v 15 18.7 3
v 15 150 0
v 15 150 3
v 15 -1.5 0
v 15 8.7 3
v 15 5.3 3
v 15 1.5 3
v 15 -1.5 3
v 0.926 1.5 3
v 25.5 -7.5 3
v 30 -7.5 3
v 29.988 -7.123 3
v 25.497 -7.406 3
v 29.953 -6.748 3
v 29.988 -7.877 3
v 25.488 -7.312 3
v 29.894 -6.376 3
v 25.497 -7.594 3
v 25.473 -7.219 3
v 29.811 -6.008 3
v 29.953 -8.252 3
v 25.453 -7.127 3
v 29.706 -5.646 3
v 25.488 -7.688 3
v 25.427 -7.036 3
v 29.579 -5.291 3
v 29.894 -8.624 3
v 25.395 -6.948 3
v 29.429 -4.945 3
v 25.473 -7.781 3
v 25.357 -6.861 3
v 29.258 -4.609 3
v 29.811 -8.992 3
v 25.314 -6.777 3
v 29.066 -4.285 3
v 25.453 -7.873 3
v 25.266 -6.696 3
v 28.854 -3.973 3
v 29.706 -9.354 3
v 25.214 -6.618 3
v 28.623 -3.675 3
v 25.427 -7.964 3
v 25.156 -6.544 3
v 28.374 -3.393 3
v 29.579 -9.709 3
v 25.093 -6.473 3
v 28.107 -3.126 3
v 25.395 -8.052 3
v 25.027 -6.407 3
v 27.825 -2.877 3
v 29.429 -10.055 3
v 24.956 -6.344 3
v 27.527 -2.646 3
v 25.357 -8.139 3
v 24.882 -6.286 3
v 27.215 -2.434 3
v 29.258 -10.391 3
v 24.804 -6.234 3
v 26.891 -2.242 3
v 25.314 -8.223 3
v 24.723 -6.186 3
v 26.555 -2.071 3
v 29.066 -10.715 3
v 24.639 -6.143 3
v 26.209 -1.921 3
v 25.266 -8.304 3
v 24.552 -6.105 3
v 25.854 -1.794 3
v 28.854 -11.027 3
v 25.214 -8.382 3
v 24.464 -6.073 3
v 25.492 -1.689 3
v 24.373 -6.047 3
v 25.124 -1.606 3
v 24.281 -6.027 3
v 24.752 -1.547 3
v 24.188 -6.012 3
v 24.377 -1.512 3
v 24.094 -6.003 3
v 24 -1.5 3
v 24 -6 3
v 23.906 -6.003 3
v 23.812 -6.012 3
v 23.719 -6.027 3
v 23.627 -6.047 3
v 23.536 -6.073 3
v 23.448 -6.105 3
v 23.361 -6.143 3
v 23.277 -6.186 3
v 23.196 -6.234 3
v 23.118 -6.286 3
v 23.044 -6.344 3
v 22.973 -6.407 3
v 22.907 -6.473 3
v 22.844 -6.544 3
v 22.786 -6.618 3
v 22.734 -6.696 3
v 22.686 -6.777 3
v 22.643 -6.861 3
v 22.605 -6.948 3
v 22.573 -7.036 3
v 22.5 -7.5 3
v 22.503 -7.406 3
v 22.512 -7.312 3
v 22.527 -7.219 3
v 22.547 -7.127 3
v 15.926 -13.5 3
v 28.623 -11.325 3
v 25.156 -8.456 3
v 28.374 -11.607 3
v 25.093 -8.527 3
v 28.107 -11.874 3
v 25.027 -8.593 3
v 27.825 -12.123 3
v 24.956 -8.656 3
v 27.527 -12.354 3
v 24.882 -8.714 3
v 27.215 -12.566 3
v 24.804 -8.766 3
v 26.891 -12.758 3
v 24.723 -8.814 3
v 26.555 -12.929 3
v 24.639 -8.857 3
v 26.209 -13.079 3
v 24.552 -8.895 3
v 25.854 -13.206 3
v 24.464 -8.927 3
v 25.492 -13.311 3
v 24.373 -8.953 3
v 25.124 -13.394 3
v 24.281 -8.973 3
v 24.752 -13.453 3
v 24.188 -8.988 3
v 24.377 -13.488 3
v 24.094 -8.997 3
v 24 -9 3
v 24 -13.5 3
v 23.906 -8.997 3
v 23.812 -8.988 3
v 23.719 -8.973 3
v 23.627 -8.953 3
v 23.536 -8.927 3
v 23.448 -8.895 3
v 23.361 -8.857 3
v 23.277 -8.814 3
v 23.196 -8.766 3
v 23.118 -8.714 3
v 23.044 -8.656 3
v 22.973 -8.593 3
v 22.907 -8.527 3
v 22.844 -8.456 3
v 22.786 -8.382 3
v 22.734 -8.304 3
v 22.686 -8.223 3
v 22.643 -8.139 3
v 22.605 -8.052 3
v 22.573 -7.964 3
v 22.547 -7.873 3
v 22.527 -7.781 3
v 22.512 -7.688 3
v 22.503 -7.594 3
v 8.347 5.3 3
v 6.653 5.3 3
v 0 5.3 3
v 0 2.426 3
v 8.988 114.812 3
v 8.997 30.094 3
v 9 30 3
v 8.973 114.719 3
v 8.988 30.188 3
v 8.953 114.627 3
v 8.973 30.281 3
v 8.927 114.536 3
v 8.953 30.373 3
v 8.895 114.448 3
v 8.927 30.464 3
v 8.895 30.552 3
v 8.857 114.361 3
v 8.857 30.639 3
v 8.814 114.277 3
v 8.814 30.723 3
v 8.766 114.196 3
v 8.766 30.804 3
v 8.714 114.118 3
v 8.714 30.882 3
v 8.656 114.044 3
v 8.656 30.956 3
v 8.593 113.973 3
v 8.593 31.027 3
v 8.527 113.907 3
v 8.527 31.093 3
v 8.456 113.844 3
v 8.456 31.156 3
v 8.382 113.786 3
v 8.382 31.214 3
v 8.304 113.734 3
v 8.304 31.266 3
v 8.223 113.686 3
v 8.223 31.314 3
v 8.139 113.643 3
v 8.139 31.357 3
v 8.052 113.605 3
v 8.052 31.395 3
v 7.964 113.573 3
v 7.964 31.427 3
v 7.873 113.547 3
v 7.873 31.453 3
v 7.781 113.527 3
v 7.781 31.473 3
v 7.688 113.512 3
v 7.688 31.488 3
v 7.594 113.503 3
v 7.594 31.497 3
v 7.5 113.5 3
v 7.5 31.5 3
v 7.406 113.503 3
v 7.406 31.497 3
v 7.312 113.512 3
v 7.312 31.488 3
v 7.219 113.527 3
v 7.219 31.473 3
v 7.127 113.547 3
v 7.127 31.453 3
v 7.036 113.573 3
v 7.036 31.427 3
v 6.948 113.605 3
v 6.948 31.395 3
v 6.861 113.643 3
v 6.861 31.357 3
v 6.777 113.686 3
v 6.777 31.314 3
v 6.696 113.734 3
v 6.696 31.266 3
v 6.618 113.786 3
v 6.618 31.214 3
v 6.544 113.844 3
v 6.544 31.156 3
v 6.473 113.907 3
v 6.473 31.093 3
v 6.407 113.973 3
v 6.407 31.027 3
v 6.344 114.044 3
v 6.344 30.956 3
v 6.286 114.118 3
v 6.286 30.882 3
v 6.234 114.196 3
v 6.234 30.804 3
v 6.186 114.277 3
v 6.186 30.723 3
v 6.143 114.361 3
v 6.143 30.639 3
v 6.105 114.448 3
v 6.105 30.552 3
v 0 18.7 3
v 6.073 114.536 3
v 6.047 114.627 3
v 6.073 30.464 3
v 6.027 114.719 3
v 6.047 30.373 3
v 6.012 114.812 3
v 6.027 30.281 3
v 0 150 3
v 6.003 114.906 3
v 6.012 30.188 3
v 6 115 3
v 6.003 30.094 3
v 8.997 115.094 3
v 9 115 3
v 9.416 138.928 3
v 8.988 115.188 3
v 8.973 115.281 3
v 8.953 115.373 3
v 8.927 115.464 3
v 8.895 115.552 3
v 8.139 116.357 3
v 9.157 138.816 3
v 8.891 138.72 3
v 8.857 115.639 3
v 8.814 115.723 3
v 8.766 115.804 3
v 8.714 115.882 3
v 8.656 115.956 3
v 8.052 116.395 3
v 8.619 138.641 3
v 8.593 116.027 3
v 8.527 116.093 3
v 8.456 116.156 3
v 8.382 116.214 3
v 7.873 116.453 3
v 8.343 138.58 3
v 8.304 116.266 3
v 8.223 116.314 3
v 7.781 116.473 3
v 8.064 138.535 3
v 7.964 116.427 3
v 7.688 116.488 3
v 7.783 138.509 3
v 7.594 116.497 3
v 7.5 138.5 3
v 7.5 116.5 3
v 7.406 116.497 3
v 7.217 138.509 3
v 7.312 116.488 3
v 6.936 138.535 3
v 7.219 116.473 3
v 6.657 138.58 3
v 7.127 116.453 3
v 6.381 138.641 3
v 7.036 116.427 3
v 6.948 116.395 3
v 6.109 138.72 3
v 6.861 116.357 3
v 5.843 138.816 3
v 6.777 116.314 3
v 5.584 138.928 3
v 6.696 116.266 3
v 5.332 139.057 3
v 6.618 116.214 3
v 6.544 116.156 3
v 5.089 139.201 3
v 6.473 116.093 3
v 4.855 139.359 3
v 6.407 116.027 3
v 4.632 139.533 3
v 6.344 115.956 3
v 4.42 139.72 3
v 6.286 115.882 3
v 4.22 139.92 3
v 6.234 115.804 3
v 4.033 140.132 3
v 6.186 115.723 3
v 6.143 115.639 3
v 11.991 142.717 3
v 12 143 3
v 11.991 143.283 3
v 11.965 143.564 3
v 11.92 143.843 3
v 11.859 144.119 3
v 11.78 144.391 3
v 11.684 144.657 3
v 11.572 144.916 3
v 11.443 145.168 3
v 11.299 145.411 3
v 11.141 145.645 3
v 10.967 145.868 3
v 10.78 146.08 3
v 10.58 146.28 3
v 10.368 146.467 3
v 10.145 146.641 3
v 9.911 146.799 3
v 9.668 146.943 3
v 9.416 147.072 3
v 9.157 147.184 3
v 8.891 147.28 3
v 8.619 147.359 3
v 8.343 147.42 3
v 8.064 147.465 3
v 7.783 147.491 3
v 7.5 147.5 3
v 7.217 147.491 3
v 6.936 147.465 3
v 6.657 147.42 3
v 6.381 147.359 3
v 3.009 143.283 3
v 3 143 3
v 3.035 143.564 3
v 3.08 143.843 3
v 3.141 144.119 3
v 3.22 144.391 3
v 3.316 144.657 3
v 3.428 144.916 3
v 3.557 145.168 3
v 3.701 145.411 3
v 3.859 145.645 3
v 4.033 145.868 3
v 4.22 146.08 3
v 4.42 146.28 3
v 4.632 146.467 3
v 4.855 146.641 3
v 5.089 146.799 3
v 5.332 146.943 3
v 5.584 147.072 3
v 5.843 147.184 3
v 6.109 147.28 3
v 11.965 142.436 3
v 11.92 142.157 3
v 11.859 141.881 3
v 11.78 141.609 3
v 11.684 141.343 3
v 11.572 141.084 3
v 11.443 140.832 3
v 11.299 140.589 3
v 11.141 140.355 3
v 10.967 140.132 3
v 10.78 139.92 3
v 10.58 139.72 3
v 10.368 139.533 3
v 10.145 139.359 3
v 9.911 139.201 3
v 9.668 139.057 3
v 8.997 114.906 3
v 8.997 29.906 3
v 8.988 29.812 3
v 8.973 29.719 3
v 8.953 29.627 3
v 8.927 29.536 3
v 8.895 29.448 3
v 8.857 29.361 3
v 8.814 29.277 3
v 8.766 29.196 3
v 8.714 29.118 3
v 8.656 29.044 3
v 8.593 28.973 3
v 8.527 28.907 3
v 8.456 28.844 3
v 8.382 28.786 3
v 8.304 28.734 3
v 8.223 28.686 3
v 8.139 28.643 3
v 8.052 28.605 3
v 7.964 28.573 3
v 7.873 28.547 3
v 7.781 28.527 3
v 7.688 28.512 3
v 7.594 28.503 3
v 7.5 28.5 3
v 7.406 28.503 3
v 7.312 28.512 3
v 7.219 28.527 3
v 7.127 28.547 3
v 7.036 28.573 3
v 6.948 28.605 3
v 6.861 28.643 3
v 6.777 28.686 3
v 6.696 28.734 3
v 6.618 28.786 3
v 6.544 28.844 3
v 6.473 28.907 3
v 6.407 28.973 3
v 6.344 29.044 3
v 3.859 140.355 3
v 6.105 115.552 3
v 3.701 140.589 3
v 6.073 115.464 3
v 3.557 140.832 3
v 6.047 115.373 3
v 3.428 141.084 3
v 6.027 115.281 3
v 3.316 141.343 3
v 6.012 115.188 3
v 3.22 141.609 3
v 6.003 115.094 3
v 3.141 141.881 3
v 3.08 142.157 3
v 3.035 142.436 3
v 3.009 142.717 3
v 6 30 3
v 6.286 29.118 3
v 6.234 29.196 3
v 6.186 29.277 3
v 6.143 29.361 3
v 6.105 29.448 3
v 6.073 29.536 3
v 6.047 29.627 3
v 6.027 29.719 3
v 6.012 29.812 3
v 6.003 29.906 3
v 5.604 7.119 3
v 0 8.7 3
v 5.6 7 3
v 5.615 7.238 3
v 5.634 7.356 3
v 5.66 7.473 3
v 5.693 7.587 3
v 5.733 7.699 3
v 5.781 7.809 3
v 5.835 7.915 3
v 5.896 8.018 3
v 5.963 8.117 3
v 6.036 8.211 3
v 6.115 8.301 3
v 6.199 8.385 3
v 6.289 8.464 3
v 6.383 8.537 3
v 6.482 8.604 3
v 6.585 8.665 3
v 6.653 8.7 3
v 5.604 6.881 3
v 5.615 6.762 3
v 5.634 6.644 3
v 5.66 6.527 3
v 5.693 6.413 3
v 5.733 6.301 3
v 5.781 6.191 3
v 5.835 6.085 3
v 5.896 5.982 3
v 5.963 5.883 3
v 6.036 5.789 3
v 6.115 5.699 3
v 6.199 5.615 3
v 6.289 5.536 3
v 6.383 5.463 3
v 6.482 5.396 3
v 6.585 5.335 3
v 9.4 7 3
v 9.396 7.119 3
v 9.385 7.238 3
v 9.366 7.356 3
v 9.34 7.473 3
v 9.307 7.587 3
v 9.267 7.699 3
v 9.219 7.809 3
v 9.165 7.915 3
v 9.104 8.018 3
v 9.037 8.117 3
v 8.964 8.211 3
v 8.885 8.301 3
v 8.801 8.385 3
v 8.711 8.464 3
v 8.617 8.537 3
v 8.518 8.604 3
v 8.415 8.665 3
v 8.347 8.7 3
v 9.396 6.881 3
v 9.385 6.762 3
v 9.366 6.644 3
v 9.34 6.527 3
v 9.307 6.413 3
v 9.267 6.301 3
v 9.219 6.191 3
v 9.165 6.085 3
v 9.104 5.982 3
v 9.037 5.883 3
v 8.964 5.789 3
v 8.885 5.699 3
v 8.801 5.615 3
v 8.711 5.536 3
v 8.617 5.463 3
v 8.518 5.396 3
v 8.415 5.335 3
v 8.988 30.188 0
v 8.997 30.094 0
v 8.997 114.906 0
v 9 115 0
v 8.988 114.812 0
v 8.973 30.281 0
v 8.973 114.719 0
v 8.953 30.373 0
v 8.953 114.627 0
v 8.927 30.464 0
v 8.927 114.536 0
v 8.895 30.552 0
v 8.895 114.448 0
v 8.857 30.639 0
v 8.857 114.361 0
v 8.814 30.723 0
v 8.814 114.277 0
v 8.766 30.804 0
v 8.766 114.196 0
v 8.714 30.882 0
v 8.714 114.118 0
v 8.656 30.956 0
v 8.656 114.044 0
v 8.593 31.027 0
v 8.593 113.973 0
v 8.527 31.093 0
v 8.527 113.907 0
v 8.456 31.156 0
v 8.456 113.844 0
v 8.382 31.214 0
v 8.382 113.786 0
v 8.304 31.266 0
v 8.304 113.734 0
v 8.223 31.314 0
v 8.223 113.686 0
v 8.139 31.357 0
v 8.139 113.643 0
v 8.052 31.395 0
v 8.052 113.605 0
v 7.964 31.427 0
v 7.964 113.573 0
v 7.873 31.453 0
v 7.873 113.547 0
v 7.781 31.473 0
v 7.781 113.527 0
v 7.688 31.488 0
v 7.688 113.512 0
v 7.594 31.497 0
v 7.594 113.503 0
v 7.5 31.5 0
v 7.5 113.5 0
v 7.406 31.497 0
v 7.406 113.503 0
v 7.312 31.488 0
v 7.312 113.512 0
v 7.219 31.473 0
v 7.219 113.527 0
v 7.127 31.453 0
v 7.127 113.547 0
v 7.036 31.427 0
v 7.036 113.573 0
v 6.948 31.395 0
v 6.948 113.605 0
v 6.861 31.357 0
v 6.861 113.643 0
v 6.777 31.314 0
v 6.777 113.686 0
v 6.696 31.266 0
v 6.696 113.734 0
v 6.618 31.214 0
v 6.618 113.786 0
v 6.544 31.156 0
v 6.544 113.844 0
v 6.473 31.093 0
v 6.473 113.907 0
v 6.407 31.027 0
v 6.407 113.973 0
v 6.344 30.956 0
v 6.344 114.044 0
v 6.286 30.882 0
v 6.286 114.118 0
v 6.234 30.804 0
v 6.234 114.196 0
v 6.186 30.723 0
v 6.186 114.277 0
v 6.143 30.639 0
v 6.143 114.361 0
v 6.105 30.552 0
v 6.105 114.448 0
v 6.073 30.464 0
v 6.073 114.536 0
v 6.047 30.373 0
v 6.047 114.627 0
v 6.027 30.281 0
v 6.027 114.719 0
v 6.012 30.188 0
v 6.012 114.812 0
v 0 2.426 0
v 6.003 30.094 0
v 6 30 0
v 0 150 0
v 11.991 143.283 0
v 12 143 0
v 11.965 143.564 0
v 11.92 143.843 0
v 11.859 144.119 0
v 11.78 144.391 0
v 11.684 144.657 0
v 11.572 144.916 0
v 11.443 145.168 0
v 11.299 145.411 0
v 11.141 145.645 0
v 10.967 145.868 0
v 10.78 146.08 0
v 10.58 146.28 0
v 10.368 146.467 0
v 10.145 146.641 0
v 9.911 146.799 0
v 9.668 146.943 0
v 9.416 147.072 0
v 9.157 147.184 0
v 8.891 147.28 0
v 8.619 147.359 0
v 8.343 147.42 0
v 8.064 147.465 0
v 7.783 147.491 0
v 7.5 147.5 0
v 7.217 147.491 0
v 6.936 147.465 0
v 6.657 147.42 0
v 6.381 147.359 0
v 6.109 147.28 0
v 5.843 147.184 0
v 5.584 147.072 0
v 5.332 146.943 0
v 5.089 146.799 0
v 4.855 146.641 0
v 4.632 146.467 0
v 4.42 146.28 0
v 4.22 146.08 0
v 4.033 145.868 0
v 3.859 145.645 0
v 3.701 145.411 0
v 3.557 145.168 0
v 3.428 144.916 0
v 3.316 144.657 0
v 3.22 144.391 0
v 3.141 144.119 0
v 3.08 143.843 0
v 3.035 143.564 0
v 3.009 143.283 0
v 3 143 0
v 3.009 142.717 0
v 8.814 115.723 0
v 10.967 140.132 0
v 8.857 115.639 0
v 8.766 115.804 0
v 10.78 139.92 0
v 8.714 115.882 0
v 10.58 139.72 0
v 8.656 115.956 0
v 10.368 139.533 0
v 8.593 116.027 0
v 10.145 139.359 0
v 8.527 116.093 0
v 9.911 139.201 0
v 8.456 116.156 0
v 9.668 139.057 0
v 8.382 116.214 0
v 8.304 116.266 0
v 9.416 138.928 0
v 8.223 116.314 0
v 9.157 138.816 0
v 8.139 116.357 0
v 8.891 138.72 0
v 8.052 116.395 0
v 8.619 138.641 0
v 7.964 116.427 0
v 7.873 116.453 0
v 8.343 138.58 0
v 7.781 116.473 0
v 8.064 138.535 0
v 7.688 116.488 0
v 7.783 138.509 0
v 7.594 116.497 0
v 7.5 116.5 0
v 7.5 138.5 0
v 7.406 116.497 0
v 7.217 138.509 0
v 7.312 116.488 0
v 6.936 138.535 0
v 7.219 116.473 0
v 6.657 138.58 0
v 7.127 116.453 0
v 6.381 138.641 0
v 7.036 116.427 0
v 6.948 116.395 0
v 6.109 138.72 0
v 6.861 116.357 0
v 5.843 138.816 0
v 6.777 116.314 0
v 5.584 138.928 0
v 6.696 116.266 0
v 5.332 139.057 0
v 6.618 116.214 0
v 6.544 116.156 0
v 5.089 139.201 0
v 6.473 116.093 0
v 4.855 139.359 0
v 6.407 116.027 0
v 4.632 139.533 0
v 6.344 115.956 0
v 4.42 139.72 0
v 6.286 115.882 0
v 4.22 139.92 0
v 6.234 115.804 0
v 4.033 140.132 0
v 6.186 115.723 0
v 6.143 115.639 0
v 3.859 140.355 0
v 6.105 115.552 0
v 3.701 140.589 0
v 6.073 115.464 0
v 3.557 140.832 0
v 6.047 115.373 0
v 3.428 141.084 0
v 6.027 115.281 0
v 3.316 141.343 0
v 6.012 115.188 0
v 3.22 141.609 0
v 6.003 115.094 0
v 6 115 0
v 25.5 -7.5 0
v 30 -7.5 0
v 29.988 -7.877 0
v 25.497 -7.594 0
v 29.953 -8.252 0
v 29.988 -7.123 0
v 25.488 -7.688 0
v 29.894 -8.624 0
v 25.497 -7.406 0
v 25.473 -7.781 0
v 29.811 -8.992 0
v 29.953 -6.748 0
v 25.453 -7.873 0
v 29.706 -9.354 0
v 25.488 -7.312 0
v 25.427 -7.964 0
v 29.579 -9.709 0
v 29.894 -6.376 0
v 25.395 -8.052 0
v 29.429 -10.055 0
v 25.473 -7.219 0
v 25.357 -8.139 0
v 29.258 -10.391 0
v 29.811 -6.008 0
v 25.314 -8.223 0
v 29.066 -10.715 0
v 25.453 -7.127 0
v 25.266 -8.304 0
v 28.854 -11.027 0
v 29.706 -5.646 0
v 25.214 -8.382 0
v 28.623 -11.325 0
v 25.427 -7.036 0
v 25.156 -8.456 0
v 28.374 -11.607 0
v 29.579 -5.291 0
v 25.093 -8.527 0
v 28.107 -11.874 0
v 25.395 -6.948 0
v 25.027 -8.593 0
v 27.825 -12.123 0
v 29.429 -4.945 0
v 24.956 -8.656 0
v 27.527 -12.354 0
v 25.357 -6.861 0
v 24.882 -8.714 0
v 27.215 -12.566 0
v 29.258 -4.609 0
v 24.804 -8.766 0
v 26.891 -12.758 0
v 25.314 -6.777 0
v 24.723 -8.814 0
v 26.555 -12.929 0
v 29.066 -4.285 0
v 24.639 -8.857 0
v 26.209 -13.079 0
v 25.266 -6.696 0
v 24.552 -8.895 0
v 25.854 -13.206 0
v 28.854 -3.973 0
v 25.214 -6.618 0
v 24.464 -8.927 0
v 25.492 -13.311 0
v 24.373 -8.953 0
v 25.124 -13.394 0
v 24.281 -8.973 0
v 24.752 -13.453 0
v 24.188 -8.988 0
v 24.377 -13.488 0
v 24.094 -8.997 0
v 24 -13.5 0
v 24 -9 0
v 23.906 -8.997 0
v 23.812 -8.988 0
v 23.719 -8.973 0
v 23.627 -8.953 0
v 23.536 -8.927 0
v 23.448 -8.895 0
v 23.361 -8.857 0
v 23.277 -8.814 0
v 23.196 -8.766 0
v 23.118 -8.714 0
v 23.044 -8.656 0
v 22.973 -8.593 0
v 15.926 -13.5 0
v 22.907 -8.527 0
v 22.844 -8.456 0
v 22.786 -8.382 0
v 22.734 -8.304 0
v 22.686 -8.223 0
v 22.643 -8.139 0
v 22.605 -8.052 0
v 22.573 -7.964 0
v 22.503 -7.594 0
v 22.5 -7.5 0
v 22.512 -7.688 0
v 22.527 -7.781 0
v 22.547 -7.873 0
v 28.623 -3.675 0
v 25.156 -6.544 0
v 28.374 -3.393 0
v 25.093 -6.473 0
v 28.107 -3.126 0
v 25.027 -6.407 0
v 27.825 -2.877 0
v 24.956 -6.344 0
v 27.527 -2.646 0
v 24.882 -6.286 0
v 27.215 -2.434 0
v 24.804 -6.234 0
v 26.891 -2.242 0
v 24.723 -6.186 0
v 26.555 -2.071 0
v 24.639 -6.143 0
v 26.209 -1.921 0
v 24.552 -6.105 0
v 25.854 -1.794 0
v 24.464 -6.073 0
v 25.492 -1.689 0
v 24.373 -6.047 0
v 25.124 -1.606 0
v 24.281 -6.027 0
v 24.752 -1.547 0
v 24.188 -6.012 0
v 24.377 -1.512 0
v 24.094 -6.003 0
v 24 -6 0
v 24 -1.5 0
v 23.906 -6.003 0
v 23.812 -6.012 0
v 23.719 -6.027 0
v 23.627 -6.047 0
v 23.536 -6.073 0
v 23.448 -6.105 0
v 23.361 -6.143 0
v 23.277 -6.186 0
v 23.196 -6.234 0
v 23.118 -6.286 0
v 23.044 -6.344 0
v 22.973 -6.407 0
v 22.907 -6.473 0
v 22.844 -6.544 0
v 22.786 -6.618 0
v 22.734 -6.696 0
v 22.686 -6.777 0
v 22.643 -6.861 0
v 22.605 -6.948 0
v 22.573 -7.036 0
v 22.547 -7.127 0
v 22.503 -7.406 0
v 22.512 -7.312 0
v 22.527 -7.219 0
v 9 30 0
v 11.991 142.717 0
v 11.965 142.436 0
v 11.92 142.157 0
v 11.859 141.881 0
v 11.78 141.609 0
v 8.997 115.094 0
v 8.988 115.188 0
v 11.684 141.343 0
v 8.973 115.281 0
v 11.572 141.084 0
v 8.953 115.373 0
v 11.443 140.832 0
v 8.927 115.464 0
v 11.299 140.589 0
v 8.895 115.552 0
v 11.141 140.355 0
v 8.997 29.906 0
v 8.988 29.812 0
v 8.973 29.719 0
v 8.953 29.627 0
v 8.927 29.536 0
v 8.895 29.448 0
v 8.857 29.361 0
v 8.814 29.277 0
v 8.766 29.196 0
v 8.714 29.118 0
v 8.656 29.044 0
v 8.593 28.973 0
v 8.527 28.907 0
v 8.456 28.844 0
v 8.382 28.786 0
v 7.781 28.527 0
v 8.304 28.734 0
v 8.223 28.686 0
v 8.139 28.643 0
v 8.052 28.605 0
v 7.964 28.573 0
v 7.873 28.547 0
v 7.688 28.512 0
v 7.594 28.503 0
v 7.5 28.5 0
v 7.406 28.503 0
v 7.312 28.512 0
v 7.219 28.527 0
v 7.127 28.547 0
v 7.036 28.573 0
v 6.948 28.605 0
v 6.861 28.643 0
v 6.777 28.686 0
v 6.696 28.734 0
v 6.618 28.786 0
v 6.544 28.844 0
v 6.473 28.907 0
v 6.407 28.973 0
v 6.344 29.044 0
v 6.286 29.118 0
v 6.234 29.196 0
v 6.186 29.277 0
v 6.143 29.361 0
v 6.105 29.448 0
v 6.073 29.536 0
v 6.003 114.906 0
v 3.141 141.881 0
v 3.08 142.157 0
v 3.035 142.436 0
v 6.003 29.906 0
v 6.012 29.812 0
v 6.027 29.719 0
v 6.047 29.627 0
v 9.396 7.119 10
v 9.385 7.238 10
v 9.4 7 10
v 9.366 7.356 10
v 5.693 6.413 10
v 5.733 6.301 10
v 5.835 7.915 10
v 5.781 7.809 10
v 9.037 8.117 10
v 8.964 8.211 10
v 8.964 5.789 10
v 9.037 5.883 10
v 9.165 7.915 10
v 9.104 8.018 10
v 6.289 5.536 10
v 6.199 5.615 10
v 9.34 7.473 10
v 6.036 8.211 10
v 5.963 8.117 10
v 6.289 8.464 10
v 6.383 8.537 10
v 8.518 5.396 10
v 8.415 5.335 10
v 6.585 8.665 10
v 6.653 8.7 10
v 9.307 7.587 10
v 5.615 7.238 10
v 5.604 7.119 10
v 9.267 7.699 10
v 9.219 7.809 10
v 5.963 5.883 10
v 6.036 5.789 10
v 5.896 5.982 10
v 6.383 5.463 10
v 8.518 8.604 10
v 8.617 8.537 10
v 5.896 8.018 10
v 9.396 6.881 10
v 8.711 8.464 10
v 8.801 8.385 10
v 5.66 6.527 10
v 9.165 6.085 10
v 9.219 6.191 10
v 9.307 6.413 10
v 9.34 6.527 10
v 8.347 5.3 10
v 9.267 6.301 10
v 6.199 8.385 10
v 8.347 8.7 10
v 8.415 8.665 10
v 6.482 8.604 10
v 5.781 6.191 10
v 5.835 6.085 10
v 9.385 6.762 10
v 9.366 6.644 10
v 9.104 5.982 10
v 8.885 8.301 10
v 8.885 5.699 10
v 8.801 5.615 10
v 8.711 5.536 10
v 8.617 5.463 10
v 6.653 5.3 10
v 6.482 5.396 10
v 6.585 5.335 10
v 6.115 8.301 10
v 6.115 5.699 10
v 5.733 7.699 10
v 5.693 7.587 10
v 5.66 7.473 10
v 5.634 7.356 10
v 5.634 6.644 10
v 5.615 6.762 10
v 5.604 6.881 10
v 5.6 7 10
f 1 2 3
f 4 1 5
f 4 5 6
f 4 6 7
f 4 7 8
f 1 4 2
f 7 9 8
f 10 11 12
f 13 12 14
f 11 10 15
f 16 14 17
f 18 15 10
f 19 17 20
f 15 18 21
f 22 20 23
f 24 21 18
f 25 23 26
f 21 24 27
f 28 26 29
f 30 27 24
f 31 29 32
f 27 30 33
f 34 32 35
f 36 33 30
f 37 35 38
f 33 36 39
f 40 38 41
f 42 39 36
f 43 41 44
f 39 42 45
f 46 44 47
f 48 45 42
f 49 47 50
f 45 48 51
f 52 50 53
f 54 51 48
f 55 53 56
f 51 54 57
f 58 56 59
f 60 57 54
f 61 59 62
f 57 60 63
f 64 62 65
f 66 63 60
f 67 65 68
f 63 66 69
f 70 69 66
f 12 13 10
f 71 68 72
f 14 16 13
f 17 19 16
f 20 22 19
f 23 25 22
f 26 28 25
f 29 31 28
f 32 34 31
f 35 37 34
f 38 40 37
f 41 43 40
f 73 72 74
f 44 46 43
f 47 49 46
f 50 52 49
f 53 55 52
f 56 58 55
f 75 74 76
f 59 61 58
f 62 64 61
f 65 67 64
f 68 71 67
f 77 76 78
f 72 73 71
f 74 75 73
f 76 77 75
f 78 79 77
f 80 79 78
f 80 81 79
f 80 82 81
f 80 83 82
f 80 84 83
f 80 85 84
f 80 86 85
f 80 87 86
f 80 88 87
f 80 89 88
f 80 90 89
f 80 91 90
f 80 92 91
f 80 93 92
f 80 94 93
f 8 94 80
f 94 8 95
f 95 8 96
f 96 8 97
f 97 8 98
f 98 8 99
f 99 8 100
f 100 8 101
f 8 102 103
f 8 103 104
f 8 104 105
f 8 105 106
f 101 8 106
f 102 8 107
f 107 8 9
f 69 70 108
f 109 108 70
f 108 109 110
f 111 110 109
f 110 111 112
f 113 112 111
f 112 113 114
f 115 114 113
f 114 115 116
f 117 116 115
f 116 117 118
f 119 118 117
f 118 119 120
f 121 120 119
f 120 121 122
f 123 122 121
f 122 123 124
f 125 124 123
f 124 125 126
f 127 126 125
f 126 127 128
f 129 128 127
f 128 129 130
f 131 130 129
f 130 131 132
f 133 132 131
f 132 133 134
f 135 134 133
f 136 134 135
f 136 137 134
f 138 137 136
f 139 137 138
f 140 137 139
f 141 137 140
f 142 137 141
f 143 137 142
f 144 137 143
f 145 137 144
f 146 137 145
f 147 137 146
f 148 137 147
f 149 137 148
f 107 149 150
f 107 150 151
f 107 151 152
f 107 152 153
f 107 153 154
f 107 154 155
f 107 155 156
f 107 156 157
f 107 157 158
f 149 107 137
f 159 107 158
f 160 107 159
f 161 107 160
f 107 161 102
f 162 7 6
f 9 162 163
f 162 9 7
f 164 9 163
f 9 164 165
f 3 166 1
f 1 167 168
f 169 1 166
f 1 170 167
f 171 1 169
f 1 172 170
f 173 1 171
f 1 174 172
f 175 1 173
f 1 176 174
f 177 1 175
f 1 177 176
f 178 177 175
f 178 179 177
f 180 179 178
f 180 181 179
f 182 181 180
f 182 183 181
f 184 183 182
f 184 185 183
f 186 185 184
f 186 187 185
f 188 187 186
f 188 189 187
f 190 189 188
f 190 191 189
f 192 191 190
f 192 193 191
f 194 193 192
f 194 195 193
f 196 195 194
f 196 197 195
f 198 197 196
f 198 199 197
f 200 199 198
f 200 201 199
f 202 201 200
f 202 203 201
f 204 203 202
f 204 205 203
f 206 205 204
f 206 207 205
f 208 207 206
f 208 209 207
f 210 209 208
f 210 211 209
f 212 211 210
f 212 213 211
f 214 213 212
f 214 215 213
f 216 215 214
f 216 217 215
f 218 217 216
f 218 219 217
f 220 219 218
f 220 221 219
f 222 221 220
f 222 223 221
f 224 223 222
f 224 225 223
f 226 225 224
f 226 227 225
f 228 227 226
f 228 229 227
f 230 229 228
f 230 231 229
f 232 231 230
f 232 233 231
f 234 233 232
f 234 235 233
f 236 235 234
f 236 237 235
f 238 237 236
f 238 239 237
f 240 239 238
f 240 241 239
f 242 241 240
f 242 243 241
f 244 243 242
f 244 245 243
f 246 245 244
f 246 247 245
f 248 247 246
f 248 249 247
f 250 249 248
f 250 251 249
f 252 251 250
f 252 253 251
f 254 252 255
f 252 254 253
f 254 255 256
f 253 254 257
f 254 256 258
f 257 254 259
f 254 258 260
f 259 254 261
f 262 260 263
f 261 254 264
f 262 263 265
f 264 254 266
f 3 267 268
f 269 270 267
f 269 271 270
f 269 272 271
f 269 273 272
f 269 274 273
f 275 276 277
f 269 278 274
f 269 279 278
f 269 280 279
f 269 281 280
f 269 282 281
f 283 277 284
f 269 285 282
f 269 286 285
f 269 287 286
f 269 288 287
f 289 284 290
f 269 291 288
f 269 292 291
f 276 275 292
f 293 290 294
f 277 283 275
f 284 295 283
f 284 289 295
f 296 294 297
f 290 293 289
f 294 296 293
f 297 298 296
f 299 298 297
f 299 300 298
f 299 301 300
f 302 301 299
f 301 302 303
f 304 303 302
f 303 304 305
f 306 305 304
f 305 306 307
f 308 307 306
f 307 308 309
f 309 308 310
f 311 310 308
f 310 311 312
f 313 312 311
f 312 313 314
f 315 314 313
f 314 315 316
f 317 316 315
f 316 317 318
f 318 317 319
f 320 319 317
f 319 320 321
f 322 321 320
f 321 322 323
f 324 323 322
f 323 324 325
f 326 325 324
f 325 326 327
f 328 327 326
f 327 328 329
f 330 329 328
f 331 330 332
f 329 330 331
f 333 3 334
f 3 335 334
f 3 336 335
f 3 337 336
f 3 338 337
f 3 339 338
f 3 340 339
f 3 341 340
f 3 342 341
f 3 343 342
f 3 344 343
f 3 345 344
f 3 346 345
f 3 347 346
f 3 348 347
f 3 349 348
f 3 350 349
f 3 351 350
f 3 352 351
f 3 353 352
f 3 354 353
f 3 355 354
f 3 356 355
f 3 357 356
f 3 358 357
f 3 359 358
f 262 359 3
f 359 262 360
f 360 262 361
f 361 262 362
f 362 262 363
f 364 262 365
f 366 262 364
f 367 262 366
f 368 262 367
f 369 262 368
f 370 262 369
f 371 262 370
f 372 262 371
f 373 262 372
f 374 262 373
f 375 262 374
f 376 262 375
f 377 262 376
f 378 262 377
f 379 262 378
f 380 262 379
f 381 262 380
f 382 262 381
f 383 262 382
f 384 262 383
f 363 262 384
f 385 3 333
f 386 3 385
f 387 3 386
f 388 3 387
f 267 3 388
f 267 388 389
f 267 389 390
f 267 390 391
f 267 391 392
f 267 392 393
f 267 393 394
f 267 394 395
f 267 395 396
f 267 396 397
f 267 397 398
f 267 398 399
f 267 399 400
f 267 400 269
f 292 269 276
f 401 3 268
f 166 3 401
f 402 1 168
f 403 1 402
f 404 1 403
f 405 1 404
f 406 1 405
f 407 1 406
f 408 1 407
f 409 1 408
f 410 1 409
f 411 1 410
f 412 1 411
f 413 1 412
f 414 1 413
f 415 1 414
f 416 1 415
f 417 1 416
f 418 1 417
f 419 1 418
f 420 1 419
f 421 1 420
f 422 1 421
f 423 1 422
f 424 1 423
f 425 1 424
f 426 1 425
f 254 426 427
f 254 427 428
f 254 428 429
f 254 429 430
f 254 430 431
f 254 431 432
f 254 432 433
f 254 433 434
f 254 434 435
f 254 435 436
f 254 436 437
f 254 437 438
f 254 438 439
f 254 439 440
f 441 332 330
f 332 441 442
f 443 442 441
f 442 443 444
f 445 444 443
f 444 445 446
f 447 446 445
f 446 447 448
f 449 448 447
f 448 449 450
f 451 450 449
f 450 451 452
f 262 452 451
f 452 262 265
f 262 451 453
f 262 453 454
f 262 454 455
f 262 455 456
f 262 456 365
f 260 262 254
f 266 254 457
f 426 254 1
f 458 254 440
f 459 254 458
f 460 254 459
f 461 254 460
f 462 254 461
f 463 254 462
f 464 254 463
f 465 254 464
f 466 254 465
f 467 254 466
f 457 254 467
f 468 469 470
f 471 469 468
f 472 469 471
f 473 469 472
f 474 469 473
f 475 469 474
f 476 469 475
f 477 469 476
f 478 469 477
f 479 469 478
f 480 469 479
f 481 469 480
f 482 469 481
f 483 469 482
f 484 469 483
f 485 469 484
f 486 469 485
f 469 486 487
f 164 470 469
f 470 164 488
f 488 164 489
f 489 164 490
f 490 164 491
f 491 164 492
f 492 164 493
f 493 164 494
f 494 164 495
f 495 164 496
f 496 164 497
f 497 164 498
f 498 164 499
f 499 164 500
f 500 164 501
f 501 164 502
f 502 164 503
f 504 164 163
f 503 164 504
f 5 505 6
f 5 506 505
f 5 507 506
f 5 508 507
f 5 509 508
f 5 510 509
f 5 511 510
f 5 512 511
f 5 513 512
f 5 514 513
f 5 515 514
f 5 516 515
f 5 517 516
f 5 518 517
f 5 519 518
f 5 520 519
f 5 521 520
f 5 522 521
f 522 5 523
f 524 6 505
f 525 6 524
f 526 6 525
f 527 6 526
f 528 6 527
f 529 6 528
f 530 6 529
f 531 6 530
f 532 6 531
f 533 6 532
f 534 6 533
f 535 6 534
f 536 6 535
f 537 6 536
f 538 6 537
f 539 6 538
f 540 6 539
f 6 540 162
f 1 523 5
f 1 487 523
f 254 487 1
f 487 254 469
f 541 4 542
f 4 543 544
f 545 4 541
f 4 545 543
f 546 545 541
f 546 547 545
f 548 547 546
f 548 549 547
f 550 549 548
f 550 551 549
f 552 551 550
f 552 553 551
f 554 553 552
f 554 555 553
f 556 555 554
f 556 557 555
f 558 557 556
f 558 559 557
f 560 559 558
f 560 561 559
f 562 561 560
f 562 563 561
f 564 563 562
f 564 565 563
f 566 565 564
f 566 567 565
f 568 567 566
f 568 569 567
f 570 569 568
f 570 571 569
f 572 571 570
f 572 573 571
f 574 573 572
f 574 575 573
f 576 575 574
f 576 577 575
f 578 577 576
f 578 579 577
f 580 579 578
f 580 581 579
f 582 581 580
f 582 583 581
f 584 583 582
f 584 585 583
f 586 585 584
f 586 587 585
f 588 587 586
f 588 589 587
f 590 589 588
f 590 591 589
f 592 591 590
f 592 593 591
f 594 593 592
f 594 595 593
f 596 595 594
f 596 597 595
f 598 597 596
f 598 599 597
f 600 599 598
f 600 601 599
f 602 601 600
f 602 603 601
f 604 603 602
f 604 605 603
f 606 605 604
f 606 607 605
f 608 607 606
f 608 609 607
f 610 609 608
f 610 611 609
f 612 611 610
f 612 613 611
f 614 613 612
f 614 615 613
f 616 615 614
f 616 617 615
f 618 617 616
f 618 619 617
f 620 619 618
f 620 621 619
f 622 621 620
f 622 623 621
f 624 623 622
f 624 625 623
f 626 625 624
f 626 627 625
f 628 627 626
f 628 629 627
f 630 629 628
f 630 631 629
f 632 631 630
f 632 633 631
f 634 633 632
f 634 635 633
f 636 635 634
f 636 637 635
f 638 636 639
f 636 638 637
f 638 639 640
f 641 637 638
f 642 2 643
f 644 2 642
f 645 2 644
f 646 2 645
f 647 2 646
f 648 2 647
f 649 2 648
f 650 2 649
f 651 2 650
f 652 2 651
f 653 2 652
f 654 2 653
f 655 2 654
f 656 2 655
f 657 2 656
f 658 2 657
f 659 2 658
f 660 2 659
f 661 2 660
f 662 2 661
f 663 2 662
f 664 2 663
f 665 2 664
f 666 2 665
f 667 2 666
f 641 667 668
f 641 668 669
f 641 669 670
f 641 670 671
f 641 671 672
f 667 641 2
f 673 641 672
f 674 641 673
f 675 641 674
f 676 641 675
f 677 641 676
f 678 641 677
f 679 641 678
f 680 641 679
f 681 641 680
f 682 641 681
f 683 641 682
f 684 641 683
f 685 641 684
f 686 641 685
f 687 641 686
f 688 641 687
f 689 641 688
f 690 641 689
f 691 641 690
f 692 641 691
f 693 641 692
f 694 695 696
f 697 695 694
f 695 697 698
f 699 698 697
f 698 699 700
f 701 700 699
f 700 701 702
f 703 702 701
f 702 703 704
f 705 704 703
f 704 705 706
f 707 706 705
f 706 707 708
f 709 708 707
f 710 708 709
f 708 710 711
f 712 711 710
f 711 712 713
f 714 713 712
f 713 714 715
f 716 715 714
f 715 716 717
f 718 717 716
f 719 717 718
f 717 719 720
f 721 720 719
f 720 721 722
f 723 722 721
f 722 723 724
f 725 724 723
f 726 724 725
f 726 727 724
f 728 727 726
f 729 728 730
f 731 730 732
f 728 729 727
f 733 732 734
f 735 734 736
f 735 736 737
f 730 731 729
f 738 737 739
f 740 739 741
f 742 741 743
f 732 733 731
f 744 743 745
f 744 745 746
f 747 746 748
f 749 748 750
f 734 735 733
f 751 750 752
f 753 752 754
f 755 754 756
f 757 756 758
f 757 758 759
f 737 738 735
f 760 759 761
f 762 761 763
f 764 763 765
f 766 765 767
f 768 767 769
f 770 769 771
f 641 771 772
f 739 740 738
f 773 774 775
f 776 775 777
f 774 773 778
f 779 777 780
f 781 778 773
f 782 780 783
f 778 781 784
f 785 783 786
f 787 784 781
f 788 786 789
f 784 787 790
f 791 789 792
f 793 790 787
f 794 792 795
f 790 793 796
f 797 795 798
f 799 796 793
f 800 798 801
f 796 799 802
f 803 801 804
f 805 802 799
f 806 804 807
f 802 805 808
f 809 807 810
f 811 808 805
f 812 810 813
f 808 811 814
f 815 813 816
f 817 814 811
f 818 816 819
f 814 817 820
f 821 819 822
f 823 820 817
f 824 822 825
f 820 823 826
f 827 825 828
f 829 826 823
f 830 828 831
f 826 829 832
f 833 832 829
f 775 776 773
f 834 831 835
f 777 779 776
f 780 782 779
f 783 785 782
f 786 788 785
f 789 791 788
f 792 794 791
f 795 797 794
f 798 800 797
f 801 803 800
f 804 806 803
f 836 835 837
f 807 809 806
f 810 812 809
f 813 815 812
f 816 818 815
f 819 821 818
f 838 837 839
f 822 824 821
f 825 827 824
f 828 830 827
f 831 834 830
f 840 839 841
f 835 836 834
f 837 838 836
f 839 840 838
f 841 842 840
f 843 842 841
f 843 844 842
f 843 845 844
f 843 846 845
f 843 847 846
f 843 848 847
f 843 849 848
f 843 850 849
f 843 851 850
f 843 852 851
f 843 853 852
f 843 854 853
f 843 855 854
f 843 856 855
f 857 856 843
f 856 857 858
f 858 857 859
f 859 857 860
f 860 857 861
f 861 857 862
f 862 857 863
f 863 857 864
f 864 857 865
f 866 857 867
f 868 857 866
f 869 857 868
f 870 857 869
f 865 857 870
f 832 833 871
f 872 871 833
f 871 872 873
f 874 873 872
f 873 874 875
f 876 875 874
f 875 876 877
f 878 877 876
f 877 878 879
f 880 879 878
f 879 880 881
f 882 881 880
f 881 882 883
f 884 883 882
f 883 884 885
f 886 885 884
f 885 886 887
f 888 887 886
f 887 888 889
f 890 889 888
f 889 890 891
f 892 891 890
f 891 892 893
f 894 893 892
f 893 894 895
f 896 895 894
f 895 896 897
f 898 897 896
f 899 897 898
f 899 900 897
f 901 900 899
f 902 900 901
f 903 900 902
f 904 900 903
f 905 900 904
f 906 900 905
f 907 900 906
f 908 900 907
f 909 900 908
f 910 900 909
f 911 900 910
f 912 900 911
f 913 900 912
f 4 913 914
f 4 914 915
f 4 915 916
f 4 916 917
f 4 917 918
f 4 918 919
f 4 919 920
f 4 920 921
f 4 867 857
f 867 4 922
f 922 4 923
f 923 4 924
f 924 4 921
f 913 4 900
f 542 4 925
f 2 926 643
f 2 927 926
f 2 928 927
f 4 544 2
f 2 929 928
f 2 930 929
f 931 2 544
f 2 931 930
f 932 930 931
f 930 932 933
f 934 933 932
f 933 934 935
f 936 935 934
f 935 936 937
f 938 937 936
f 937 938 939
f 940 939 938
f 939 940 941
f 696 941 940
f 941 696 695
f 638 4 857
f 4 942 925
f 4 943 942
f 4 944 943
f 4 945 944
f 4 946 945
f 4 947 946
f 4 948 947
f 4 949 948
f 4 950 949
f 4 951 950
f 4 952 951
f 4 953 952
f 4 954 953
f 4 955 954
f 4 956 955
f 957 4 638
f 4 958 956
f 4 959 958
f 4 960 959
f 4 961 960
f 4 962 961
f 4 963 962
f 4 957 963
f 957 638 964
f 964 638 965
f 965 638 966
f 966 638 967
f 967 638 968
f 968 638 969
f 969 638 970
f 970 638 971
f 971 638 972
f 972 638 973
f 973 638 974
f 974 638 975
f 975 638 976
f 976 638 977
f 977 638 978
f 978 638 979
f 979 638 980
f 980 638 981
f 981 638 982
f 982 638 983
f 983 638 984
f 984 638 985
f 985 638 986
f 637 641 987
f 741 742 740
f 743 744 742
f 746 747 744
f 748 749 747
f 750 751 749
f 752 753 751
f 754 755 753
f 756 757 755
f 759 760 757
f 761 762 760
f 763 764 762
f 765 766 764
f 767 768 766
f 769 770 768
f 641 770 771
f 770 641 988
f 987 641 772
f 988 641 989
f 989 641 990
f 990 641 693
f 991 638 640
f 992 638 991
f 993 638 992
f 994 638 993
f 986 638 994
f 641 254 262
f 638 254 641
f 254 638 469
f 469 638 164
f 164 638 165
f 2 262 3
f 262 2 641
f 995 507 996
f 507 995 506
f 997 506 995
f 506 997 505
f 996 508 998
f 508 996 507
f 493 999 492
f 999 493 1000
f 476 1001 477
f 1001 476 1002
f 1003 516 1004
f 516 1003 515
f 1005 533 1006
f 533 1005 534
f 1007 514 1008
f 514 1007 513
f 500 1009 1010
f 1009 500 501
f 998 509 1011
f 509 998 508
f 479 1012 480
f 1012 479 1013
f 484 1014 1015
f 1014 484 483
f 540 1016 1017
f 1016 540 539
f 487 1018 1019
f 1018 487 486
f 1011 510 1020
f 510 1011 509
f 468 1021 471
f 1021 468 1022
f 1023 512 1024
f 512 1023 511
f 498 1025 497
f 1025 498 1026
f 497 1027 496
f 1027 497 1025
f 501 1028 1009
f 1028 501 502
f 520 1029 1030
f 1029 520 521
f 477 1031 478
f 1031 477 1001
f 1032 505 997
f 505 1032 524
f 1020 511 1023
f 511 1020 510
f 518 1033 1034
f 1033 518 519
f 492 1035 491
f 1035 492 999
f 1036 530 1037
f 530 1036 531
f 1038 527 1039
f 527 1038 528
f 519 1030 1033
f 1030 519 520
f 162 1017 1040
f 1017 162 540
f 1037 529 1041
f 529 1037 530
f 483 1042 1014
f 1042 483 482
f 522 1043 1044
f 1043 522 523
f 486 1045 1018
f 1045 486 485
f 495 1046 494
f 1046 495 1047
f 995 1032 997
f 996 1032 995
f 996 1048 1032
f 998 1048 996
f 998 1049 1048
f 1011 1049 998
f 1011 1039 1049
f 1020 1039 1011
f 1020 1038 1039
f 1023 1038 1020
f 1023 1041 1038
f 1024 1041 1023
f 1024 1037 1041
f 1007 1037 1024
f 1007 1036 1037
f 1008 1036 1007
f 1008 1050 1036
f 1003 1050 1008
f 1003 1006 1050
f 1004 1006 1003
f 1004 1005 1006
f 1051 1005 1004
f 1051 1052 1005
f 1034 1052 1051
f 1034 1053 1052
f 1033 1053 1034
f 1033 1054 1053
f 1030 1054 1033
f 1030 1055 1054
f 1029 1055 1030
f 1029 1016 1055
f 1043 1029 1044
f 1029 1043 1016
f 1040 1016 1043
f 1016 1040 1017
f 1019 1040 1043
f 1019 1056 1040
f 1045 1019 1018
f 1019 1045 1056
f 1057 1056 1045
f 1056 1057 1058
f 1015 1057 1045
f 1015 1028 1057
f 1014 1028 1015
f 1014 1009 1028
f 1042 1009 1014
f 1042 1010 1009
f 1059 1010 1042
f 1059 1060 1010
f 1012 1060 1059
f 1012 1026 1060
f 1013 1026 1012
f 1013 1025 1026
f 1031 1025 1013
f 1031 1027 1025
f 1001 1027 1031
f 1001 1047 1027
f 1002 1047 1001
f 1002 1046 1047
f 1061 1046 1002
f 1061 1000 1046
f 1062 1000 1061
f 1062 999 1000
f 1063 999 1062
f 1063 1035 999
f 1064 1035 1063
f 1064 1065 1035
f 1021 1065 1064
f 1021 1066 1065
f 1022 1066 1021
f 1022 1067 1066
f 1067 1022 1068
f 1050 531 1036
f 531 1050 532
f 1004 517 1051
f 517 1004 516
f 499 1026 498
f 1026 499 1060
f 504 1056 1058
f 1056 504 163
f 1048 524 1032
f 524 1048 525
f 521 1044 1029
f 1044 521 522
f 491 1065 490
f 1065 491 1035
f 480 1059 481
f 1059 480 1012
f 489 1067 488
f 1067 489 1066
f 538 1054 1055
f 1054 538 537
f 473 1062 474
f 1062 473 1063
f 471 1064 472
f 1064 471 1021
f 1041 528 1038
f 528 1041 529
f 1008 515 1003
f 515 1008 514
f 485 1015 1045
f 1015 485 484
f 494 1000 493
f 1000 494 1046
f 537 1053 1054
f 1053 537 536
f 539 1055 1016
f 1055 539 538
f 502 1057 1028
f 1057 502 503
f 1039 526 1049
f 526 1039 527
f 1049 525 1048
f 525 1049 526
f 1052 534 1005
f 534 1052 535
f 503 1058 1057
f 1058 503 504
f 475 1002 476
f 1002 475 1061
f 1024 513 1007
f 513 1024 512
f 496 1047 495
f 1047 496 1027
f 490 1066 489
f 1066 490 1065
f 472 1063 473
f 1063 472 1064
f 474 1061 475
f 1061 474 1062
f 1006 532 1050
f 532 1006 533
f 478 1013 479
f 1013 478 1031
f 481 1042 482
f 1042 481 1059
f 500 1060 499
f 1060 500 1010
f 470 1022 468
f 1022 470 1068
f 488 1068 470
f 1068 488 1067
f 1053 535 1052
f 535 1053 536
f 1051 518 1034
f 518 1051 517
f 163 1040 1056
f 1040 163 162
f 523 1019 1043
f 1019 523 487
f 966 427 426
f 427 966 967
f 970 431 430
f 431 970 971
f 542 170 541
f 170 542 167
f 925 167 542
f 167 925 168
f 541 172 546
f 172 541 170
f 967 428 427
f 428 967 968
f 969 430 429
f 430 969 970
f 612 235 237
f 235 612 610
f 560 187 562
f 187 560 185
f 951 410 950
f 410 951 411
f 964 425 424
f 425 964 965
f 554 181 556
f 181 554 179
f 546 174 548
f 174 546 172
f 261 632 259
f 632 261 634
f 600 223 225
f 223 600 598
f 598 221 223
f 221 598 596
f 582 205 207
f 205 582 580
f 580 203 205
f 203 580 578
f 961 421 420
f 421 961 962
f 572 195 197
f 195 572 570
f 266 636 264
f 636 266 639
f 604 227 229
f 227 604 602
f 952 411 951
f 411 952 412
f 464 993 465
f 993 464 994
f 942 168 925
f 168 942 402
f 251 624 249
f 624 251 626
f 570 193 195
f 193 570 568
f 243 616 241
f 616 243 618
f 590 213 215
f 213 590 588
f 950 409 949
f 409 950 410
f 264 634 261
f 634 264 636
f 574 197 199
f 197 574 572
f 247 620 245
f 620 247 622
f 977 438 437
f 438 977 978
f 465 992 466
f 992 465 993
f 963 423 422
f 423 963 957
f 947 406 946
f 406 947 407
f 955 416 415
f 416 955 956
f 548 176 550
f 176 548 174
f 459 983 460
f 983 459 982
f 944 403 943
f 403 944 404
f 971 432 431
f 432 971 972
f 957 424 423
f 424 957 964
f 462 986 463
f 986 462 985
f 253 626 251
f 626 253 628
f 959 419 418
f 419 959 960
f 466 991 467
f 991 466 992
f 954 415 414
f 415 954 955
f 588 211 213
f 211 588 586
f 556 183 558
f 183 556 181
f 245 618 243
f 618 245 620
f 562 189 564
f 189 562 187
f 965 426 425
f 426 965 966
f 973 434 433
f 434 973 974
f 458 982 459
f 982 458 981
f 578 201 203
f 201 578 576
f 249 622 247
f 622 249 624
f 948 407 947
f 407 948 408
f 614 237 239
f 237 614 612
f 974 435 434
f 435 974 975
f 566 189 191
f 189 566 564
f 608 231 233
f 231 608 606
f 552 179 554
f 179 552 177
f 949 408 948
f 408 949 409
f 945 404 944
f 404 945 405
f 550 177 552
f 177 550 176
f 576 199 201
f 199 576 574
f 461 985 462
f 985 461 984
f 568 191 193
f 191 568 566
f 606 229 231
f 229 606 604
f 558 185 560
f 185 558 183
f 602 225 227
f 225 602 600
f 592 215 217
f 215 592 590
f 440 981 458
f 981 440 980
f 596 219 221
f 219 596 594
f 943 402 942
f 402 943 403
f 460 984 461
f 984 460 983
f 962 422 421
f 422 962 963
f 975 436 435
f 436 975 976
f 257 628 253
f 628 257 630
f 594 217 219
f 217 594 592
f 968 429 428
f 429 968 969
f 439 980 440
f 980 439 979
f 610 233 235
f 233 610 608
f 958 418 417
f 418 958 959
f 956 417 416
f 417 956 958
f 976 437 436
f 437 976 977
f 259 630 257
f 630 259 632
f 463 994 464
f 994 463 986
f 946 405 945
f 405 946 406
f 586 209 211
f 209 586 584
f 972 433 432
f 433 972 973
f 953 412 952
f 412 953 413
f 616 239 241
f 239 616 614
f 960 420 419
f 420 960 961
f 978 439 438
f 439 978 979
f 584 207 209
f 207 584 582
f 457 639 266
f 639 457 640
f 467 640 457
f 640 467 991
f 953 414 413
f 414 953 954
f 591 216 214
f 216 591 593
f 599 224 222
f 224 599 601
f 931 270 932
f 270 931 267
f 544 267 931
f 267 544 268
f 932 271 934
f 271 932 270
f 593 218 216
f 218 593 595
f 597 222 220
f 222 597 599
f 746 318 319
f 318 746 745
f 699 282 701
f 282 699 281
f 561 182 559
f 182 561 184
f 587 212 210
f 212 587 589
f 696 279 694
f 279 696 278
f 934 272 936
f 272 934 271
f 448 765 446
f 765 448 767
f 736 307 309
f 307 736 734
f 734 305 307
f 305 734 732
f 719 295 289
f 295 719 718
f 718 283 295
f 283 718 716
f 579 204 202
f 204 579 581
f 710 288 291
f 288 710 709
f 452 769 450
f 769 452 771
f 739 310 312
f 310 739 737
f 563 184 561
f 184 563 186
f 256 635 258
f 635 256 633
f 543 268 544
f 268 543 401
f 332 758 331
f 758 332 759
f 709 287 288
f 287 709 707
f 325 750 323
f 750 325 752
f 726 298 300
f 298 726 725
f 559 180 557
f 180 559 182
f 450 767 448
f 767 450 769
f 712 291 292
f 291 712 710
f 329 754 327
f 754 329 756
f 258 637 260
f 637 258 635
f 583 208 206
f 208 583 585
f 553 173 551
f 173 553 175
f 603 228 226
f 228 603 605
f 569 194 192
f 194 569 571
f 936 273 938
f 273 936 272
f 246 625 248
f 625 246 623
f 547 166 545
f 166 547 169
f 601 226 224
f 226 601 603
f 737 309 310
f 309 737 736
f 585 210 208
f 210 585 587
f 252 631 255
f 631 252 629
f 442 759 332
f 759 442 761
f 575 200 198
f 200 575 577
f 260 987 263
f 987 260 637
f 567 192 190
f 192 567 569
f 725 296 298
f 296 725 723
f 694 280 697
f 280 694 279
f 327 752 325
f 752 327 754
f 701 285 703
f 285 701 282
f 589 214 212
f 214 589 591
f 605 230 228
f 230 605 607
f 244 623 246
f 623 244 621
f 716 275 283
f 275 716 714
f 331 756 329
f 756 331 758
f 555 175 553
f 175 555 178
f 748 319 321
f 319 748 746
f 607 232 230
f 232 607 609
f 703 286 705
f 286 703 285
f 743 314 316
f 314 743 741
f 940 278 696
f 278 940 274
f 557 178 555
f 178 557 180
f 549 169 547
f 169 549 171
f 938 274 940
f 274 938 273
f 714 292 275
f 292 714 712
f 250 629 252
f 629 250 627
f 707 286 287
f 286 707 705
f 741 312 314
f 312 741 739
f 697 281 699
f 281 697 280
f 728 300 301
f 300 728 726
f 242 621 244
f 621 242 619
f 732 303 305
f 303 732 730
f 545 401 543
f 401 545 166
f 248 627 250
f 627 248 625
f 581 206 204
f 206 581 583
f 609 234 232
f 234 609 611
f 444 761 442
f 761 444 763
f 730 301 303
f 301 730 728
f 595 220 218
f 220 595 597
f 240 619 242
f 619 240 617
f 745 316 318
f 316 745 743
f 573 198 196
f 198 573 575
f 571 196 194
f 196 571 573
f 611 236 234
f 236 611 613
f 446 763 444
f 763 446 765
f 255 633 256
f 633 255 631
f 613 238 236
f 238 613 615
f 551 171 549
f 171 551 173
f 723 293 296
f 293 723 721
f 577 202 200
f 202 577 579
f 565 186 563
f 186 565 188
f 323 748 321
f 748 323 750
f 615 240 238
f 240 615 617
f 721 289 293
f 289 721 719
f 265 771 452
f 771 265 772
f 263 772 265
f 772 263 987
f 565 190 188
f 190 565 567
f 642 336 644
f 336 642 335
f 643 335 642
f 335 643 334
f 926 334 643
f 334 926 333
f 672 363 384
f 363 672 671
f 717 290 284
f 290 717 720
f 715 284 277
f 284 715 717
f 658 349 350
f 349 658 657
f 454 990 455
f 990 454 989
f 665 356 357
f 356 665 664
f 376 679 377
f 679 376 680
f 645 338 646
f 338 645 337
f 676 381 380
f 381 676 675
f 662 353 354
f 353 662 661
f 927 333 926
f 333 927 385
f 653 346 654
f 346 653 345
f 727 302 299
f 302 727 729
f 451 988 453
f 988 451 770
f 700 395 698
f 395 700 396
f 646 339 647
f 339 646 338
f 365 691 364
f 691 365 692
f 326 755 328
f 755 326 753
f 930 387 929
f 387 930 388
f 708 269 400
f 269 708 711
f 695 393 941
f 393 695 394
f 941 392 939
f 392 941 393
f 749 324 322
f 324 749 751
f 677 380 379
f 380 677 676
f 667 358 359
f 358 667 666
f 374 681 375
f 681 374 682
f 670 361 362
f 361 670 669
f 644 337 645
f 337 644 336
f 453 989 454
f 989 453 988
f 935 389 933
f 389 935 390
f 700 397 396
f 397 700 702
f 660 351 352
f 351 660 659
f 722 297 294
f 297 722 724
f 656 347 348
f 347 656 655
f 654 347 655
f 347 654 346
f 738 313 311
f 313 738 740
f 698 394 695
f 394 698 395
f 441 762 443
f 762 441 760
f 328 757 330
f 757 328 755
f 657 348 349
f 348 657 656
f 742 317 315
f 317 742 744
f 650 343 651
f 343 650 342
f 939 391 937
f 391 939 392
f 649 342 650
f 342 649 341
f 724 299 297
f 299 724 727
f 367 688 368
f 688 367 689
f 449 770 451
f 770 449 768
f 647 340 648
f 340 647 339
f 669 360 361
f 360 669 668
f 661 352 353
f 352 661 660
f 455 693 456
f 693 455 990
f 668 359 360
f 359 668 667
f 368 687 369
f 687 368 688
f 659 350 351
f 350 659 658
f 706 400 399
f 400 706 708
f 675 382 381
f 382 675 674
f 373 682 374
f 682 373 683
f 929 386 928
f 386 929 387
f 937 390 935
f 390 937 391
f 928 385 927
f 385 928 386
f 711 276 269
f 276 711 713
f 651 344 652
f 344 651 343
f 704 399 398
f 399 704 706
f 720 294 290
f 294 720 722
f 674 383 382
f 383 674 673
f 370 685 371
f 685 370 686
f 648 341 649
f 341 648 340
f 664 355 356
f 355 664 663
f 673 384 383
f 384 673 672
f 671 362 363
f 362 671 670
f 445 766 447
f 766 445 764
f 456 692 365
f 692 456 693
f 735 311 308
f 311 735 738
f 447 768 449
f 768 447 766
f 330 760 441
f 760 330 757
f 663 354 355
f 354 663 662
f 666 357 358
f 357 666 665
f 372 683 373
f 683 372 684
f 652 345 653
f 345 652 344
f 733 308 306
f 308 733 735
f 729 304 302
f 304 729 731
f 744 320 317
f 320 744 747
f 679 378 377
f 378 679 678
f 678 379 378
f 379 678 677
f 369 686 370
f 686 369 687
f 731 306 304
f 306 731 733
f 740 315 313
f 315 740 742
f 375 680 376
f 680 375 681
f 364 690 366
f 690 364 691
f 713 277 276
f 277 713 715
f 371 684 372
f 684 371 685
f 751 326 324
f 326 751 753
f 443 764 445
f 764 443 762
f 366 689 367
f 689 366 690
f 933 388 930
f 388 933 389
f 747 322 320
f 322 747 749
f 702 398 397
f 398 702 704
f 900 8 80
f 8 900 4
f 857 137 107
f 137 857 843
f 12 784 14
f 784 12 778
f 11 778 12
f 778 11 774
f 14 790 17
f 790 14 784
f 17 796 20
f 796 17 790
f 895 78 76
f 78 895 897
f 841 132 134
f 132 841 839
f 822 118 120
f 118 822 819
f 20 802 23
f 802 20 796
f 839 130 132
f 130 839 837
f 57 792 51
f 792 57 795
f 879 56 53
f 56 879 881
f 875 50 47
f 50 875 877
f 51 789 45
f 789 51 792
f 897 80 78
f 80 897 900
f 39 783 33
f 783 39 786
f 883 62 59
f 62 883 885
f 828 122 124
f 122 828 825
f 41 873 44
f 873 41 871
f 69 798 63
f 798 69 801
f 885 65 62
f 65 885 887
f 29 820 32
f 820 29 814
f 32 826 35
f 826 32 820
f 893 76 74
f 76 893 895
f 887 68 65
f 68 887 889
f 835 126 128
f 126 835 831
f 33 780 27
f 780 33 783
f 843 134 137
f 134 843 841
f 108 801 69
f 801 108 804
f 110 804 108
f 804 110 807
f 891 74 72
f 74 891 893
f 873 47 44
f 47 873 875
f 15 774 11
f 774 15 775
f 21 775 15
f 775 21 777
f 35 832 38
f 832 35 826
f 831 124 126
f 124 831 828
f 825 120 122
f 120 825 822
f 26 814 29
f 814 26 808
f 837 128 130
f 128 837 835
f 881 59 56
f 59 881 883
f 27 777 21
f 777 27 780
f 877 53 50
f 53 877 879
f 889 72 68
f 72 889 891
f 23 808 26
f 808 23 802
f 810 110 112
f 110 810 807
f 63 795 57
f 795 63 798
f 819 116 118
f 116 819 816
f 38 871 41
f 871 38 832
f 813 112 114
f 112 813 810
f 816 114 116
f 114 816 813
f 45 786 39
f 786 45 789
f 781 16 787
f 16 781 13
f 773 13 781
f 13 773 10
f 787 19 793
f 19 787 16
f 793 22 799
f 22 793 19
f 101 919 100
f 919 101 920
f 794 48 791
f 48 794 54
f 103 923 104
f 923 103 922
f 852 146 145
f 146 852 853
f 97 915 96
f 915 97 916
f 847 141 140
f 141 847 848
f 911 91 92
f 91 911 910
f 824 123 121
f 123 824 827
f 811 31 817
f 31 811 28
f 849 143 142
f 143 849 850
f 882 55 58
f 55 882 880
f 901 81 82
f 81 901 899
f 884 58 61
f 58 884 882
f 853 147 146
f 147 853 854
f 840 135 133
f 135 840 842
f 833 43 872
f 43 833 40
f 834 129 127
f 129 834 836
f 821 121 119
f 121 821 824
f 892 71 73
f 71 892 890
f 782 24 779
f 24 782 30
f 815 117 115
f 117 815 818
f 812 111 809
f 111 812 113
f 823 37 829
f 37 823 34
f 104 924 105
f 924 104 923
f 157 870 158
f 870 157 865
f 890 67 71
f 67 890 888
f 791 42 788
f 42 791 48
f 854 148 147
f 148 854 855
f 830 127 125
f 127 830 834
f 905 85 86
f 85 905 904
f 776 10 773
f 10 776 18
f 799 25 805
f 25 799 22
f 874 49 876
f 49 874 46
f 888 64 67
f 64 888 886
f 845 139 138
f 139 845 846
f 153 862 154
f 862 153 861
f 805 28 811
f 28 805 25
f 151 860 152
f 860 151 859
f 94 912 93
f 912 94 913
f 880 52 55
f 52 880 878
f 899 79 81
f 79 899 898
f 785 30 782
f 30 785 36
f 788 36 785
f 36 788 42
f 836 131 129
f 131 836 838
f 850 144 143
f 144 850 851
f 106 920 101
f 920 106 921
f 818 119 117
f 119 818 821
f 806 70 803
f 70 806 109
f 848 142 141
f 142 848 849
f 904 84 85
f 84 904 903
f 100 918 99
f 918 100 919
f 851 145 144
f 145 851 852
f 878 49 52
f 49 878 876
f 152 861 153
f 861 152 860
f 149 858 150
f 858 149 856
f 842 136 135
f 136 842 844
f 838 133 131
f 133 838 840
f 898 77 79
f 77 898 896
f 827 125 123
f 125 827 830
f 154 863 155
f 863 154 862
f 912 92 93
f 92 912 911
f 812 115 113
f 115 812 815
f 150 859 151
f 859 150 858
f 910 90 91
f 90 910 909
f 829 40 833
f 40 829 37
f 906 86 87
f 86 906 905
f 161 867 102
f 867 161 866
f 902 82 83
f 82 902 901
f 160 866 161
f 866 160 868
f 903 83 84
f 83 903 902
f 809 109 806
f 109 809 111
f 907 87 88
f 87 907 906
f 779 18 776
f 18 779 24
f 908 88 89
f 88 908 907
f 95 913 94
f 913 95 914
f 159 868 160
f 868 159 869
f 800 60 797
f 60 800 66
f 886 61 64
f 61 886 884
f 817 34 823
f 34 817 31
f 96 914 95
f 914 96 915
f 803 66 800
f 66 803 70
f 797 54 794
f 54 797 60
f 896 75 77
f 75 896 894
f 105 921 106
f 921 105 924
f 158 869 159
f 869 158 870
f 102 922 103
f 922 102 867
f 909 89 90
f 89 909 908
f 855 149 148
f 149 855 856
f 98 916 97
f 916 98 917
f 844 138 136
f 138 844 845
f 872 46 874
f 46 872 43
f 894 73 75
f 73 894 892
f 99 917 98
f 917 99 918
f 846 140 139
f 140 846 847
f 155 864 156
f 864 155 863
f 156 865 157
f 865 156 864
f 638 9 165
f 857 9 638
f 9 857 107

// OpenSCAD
difference(){
	union(){        
        lengte = 150;
        dikte = 3;

difference(){
	union(){   
        
        translate([0,0,0]){
           cube([15,lengte,dikte], center=false);
        }
     
        translate([7.5,7,0]){
            rotate(a = [0,0,0]) {
                cylinder(h=10, r=1.9, $fn=100, center=false);
            }
        }	

        
	}
	union() {
/* hoekjes van potmeter as */
        translate([0,-4.7,3]){
           cube([20,10,20], center=false);
        }
        translate([0,8.7,3]){
           cube([20,10,20], center=false);
        }

/* gaten in as */
        translate([7.5,30,-10]){
            rotate(a = [0,0,0]) {
                cylinder(h=400, r=1.5, $fn=100, center=false);
            }
        }	
        translate([7.5,lengte-35,-10]){
            rotate(a = [0,0,0]) {
                cylinder(h=400, r=1.5, $fn=100, center=false);
            }
        }	

        



/* gat voor lager */
        translate([7.5,lengte-7,-10]){
            rotate(a = [0,0,0]) {
                cylinder(h=400, r=4.5, $fn=100, center=false);
            }
        }	
/*
        translate([7.5,7,-10]){
            rotate(a = [0,0,0]) {
                cylinder(h=400, r=3.8, $fn=100, center=false);
            }
        }	
*/
	}
}


        translate([0,-13.5,0]){
           cube([24,12,dikte], center=false);
        }
        translate([0,-13.5,0]){
           cube([15,15,dikte], center=false);
        }
        
        translate([24,-7.5,0]){
            rotate(a = [0,0,0]) {
                cylinder(h=dikte, r=6, $fn=100, center=false);
            }
        }	



        
	}
	union() {

/* gat voor lager */
        translate([24,-7.5,-10]){
            rotate(a = [0,0,0]) {
                cylinder(h=400, r=1.5, $fn=100, center=false);
            }
        }	

        translate([0,-40,-10]){
           rotate(a = [0,0,45]) {
            cube([30,30,20], center=false);
           }
        }

	}
}
